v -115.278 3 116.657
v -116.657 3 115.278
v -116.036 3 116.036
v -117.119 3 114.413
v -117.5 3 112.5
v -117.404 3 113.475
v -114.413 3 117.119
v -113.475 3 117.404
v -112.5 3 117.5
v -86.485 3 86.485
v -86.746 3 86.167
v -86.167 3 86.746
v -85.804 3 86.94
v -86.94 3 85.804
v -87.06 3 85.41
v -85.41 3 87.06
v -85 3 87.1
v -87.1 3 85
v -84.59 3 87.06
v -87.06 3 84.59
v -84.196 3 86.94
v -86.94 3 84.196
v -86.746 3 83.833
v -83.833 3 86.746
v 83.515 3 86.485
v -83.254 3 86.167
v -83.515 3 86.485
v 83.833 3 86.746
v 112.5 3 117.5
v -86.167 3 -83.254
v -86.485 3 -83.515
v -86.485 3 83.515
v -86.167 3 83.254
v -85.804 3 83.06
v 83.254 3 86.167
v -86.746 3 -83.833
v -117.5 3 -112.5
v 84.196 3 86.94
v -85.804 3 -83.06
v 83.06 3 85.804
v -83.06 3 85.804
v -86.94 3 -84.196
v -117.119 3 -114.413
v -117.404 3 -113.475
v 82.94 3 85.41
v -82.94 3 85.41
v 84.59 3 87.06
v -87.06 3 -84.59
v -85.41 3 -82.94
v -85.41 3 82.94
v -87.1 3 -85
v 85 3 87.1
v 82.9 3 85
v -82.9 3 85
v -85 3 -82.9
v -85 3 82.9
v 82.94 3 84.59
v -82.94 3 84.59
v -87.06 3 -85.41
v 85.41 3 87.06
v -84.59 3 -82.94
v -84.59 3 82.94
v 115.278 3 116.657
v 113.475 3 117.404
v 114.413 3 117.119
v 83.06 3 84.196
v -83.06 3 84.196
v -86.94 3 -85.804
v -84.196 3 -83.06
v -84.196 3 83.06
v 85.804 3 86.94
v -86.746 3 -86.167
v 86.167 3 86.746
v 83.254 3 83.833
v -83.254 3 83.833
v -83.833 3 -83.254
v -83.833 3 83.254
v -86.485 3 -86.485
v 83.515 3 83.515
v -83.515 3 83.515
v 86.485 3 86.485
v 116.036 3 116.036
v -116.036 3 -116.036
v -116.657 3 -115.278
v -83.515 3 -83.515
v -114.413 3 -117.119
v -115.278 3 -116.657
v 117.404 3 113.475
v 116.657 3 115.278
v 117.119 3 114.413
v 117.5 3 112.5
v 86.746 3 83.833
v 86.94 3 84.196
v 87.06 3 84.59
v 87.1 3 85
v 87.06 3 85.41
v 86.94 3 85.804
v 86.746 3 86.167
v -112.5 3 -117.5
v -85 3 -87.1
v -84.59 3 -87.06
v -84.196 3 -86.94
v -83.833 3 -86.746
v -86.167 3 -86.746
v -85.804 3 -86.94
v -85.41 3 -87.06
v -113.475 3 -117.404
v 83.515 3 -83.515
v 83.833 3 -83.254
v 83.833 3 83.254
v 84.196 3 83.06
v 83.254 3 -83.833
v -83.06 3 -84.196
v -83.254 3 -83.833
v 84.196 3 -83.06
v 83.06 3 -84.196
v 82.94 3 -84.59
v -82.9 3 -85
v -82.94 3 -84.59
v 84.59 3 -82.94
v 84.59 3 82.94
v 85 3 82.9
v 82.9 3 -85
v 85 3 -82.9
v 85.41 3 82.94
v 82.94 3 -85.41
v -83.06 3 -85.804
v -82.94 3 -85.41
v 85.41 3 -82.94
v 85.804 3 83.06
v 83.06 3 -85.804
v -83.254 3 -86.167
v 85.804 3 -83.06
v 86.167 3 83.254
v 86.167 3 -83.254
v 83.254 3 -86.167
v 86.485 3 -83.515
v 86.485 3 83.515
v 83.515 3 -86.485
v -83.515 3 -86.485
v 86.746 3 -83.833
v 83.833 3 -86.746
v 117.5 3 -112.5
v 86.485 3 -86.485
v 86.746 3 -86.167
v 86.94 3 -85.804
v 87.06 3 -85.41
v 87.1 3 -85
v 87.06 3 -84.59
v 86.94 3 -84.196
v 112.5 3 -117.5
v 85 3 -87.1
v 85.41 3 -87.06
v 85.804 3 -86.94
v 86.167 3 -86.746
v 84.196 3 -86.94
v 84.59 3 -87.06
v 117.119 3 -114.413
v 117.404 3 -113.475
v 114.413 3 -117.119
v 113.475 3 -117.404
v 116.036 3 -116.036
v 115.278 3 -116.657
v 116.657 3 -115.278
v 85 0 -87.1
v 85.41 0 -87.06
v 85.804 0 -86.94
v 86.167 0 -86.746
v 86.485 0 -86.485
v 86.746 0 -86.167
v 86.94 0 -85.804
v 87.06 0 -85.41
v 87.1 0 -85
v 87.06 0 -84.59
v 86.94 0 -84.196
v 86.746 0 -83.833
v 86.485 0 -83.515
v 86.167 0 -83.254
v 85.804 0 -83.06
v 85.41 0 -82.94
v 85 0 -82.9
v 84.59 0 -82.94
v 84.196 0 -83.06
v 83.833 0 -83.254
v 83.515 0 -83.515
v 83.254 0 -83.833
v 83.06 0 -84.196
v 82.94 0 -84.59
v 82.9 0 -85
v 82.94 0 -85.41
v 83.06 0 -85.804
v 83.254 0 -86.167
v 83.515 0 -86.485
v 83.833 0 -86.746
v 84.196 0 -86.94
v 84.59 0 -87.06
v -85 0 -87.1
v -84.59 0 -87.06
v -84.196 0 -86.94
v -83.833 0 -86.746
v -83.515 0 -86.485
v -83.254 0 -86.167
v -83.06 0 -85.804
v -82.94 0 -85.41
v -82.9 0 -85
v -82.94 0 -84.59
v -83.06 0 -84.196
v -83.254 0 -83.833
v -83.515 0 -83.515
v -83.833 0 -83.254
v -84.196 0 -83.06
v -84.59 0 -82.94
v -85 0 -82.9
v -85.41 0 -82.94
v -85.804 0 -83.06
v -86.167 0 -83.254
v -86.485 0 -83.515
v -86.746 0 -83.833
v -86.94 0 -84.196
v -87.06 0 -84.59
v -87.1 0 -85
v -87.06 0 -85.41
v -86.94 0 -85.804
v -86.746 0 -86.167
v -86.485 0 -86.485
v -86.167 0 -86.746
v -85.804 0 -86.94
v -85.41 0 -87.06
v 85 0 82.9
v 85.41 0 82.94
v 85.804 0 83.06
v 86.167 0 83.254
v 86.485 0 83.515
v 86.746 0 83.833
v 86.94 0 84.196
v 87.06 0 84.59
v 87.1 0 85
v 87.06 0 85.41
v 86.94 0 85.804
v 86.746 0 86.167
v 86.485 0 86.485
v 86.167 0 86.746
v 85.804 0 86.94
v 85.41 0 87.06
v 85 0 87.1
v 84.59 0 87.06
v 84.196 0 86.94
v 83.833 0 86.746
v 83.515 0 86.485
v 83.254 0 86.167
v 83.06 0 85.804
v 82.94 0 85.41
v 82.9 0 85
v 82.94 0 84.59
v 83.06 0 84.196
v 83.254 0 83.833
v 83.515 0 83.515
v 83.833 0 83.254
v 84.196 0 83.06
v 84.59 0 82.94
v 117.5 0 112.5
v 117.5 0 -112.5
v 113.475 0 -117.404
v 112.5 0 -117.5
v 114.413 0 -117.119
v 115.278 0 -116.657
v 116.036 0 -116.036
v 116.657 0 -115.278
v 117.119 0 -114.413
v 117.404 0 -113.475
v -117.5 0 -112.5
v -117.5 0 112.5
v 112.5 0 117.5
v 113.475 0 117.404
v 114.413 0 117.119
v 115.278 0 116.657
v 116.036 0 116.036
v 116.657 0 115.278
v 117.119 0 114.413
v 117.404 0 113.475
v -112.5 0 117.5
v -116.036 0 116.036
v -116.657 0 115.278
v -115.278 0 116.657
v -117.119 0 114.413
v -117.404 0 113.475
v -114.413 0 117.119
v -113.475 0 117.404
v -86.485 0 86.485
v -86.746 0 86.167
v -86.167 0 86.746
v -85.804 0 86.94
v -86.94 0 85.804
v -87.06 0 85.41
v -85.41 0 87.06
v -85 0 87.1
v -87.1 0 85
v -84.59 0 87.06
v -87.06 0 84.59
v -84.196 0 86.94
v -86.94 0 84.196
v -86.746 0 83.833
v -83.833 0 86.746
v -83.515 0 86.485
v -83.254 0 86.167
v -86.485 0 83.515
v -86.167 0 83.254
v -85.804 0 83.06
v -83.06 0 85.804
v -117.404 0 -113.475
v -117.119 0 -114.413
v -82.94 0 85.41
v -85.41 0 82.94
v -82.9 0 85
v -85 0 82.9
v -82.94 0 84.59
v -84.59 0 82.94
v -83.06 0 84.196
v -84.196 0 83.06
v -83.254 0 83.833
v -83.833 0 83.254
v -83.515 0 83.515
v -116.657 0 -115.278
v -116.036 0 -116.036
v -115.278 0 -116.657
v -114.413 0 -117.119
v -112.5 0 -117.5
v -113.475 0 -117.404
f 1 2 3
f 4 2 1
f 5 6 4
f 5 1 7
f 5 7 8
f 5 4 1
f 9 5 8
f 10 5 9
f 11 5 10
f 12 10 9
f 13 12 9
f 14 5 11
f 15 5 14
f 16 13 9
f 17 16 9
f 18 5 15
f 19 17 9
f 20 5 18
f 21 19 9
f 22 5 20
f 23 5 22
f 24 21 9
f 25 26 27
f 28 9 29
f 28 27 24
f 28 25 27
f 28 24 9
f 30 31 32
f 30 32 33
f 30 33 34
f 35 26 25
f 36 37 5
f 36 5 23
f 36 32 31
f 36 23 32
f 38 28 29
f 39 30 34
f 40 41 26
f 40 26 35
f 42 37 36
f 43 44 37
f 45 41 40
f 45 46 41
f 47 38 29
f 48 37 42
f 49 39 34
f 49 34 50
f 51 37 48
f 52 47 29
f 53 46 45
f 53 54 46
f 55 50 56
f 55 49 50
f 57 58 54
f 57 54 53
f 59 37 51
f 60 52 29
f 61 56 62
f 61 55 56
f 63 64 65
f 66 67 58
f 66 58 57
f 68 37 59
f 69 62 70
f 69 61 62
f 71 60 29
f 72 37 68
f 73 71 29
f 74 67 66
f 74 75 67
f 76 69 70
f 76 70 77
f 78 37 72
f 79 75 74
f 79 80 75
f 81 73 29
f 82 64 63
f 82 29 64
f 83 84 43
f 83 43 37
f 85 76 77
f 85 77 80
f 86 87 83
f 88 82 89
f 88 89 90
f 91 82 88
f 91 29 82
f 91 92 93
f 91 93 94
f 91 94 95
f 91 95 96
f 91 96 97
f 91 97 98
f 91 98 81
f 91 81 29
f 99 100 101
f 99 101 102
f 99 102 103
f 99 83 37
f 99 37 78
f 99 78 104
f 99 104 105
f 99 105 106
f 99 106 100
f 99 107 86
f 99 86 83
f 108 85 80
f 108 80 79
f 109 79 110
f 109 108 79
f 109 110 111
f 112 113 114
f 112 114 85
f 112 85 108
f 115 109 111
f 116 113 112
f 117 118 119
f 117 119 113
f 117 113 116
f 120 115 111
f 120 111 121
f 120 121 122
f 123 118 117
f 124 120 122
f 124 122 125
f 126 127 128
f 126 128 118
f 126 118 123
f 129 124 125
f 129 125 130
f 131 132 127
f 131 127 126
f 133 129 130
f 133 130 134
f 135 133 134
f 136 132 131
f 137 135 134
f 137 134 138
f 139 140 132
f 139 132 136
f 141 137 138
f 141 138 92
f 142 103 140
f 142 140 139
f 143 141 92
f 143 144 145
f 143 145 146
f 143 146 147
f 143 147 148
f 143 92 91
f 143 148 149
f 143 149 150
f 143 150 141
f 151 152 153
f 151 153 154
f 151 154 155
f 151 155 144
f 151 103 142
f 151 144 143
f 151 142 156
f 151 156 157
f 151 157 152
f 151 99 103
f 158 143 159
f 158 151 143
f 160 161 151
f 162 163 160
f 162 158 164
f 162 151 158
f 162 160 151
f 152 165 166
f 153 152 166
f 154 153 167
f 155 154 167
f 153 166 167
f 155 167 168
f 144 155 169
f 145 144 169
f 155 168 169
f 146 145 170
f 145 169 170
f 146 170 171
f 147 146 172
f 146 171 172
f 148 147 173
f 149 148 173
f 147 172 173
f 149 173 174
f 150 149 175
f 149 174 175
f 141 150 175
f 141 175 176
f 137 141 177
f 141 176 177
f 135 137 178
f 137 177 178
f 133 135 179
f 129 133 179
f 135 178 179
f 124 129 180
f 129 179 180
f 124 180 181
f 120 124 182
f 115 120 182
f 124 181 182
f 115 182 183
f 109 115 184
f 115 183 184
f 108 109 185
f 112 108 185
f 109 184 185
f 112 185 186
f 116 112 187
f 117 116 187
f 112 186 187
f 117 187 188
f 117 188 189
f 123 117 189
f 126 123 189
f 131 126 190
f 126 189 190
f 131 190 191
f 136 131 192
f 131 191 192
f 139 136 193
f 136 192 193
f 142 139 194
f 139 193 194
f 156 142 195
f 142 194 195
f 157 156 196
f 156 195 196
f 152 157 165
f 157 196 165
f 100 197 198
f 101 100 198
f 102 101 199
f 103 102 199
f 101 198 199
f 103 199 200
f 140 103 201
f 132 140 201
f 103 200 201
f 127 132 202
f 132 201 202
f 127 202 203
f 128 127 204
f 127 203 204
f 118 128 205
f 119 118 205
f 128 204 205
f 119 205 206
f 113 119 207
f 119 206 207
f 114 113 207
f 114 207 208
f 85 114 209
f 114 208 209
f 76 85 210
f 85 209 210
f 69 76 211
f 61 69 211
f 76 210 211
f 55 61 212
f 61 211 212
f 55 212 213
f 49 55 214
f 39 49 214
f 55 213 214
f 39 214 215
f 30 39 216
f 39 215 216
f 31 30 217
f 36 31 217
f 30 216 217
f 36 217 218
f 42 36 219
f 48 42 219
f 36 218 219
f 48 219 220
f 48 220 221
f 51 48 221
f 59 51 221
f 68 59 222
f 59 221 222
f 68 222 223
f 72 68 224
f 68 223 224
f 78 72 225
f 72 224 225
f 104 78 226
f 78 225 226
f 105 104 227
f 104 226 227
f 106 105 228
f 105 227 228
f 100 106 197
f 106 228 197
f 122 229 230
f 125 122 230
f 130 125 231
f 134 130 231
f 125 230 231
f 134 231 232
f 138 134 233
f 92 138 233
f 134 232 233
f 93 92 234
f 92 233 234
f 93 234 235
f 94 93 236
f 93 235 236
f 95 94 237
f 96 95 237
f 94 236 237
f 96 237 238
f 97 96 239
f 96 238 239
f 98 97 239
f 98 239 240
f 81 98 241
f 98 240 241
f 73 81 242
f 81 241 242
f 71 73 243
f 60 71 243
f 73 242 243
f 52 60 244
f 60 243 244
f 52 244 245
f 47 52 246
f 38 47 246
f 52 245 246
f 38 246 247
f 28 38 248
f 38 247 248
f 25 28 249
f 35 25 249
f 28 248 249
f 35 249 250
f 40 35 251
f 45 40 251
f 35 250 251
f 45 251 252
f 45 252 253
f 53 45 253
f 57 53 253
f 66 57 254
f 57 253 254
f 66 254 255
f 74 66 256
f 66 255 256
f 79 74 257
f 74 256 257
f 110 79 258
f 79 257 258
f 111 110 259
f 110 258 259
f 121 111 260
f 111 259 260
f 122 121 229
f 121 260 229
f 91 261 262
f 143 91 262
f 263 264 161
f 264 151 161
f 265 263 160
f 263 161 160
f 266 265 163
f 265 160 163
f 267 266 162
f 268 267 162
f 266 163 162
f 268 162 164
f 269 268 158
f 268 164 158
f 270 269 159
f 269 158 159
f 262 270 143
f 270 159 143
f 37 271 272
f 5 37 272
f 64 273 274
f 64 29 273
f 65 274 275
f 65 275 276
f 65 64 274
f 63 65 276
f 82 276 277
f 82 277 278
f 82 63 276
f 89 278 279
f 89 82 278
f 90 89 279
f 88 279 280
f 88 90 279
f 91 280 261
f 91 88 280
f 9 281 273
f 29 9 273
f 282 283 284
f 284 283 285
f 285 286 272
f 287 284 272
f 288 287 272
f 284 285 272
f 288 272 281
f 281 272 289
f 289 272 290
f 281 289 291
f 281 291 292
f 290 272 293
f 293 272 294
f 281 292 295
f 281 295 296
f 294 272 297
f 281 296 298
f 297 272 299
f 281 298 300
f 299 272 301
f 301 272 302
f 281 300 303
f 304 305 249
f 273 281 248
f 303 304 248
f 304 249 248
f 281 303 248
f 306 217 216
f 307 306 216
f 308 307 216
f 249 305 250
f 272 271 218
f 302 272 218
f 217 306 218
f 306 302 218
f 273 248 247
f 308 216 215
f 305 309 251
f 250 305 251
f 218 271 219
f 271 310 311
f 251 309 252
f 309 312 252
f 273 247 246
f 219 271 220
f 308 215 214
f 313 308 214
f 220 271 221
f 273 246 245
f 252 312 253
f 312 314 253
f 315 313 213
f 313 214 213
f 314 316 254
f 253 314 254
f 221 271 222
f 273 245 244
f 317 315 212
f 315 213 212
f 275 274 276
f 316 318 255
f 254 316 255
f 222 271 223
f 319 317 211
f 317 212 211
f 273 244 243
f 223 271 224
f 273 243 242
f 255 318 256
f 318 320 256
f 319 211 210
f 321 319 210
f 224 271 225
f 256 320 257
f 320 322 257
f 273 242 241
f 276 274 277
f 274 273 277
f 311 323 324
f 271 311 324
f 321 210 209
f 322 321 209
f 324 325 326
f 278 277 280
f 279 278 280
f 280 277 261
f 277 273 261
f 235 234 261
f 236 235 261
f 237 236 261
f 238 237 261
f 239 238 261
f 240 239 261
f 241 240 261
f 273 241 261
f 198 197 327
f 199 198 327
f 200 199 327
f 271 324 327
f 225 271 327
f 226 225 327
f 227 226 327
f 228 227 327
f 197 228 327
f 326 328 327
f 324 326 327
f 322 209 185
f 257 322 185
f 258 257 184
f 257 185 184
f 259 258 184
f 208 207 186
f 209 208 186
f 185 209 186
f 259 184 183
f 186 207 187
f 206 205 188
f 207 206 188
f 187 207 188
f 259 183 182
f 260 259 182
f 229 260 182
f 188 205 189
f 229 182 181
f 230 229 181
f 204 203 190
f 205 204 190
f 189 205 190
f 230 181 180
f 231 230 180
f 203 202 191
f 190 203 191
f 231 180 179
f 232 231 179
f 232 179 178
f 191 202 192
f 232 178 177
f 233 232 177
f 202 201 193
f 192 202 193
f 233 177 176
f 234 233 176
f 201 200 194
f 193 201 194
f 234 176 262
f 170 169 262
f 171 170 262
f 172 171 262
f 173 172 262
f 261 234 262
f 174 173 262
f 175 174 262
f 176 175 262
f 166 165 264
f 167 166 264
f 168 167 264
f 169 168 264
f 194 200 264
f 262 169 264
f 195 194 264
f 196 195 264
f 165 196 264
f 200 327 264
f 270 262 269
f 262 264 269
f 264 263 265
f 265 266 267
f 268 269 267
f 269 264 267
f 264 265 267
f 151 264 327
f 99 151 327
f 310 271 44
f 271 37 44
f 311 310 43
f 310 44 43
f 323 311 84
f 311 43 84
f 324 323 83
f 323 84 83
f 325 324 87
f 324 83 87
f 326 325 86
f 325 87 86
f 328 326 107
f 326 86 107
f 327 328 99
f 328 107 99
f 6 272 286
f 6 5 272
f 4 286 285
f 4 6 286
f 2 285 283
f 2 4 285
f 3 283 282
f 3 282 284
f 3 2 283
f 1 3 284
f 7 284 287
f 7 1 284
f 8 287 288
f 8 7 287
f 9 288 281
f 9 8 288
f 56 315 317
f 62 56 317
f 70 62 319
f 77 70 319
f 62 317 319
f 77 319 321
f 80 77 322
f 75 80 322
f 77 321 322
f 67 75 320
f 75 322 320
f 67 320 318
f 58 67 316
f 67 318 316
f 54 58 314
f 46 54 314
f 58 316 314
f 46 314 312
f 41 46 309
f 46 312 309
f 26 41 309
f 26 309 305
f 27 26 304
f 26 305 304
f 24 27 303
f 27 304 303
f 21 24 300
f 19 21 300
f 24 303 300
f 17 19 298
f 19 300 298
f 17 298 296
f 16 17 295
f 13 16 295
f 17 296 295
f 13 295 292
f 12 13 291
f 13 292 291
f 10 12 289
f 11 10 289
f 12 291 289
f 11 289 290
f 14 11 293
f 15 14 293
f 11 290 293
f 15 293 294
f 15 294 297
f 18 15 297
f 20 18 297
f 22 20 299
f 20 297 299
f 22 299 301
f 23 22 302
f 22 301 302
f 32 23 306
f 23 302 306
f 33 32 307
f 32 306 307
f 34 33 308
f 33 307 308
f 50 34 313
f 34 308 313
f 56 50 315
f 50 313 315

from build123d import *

# Parameters (mm, degrees)
BOSS_EXTRUDE1_DEPTH = 3
SKETCH2_R           = 2.1
CUT_EXTRUDE1_DEPTH  = 3
FILLET1_R           = 5


with BuildPart() as part:
    # Sketch1 → Boss-Extrude1 (new body)
    with BuildSketch(Plane(origin=(0, 0, 0), x_dir=(1, 0, 0), z_dir=(0, 1, 0))):
        Polygon((0, 0), (-117.5, 117.5), (-117.5, -67.83865663), align=None)
        Polygon((0, 117.5), (-117.5, 117.5), (0, 0), align=None)
        Polygon((0, 117.5), (0, 0), (117.5, -67.83865663), (117.5, 117.5), align=None)
        Polygon((117.5, -67.83865663), (0, 0), (117.5, -117.5), align=None)
        Polygon((117.5, -117.5), (0, 0), (-117.5, -67.83865663), (-117.5, -117.5), align=None)
    extrude(amount=BOSS_EXTRUDE1_DEPTH)

    # Sketch2 → Cut-Extrude1 (cut)
    with BuildSketch(Plane.XZ):
        with Locations(Location((85, -85, 0), (0, 0, 270))):
            Circle(SKETCH2_R)
        with Locations(Location((-85, 85, 0), (0, 0, 270))):
            Circle(SKETCH2_R)
        with Locations(Location((85, 85, 0), (0, 0, 270))):
            Circle(SKETCH2_R)
        with Locations(Location((-85, -85, 0), (0, 0, 270))):
            Circle(SKETCH2_R)
    extrude(amount=-CUT_EXTRUDE1_DEPTH, mode=Mode.SUBTRACT)

    # Fillet1
    fillet1_edges = [part.edges().sort_by_distance(p)[0] for p in [
        (-117.5, 1.5, 117.5),
        (-117.5, 1.5, -117.5),
        (117.5, 1.5, -117.5),
        (117.5, 1.5, 117.5),
    ]]
    fillet(fillet1_edges, radius=FILLET1_R)


solid = part.part
